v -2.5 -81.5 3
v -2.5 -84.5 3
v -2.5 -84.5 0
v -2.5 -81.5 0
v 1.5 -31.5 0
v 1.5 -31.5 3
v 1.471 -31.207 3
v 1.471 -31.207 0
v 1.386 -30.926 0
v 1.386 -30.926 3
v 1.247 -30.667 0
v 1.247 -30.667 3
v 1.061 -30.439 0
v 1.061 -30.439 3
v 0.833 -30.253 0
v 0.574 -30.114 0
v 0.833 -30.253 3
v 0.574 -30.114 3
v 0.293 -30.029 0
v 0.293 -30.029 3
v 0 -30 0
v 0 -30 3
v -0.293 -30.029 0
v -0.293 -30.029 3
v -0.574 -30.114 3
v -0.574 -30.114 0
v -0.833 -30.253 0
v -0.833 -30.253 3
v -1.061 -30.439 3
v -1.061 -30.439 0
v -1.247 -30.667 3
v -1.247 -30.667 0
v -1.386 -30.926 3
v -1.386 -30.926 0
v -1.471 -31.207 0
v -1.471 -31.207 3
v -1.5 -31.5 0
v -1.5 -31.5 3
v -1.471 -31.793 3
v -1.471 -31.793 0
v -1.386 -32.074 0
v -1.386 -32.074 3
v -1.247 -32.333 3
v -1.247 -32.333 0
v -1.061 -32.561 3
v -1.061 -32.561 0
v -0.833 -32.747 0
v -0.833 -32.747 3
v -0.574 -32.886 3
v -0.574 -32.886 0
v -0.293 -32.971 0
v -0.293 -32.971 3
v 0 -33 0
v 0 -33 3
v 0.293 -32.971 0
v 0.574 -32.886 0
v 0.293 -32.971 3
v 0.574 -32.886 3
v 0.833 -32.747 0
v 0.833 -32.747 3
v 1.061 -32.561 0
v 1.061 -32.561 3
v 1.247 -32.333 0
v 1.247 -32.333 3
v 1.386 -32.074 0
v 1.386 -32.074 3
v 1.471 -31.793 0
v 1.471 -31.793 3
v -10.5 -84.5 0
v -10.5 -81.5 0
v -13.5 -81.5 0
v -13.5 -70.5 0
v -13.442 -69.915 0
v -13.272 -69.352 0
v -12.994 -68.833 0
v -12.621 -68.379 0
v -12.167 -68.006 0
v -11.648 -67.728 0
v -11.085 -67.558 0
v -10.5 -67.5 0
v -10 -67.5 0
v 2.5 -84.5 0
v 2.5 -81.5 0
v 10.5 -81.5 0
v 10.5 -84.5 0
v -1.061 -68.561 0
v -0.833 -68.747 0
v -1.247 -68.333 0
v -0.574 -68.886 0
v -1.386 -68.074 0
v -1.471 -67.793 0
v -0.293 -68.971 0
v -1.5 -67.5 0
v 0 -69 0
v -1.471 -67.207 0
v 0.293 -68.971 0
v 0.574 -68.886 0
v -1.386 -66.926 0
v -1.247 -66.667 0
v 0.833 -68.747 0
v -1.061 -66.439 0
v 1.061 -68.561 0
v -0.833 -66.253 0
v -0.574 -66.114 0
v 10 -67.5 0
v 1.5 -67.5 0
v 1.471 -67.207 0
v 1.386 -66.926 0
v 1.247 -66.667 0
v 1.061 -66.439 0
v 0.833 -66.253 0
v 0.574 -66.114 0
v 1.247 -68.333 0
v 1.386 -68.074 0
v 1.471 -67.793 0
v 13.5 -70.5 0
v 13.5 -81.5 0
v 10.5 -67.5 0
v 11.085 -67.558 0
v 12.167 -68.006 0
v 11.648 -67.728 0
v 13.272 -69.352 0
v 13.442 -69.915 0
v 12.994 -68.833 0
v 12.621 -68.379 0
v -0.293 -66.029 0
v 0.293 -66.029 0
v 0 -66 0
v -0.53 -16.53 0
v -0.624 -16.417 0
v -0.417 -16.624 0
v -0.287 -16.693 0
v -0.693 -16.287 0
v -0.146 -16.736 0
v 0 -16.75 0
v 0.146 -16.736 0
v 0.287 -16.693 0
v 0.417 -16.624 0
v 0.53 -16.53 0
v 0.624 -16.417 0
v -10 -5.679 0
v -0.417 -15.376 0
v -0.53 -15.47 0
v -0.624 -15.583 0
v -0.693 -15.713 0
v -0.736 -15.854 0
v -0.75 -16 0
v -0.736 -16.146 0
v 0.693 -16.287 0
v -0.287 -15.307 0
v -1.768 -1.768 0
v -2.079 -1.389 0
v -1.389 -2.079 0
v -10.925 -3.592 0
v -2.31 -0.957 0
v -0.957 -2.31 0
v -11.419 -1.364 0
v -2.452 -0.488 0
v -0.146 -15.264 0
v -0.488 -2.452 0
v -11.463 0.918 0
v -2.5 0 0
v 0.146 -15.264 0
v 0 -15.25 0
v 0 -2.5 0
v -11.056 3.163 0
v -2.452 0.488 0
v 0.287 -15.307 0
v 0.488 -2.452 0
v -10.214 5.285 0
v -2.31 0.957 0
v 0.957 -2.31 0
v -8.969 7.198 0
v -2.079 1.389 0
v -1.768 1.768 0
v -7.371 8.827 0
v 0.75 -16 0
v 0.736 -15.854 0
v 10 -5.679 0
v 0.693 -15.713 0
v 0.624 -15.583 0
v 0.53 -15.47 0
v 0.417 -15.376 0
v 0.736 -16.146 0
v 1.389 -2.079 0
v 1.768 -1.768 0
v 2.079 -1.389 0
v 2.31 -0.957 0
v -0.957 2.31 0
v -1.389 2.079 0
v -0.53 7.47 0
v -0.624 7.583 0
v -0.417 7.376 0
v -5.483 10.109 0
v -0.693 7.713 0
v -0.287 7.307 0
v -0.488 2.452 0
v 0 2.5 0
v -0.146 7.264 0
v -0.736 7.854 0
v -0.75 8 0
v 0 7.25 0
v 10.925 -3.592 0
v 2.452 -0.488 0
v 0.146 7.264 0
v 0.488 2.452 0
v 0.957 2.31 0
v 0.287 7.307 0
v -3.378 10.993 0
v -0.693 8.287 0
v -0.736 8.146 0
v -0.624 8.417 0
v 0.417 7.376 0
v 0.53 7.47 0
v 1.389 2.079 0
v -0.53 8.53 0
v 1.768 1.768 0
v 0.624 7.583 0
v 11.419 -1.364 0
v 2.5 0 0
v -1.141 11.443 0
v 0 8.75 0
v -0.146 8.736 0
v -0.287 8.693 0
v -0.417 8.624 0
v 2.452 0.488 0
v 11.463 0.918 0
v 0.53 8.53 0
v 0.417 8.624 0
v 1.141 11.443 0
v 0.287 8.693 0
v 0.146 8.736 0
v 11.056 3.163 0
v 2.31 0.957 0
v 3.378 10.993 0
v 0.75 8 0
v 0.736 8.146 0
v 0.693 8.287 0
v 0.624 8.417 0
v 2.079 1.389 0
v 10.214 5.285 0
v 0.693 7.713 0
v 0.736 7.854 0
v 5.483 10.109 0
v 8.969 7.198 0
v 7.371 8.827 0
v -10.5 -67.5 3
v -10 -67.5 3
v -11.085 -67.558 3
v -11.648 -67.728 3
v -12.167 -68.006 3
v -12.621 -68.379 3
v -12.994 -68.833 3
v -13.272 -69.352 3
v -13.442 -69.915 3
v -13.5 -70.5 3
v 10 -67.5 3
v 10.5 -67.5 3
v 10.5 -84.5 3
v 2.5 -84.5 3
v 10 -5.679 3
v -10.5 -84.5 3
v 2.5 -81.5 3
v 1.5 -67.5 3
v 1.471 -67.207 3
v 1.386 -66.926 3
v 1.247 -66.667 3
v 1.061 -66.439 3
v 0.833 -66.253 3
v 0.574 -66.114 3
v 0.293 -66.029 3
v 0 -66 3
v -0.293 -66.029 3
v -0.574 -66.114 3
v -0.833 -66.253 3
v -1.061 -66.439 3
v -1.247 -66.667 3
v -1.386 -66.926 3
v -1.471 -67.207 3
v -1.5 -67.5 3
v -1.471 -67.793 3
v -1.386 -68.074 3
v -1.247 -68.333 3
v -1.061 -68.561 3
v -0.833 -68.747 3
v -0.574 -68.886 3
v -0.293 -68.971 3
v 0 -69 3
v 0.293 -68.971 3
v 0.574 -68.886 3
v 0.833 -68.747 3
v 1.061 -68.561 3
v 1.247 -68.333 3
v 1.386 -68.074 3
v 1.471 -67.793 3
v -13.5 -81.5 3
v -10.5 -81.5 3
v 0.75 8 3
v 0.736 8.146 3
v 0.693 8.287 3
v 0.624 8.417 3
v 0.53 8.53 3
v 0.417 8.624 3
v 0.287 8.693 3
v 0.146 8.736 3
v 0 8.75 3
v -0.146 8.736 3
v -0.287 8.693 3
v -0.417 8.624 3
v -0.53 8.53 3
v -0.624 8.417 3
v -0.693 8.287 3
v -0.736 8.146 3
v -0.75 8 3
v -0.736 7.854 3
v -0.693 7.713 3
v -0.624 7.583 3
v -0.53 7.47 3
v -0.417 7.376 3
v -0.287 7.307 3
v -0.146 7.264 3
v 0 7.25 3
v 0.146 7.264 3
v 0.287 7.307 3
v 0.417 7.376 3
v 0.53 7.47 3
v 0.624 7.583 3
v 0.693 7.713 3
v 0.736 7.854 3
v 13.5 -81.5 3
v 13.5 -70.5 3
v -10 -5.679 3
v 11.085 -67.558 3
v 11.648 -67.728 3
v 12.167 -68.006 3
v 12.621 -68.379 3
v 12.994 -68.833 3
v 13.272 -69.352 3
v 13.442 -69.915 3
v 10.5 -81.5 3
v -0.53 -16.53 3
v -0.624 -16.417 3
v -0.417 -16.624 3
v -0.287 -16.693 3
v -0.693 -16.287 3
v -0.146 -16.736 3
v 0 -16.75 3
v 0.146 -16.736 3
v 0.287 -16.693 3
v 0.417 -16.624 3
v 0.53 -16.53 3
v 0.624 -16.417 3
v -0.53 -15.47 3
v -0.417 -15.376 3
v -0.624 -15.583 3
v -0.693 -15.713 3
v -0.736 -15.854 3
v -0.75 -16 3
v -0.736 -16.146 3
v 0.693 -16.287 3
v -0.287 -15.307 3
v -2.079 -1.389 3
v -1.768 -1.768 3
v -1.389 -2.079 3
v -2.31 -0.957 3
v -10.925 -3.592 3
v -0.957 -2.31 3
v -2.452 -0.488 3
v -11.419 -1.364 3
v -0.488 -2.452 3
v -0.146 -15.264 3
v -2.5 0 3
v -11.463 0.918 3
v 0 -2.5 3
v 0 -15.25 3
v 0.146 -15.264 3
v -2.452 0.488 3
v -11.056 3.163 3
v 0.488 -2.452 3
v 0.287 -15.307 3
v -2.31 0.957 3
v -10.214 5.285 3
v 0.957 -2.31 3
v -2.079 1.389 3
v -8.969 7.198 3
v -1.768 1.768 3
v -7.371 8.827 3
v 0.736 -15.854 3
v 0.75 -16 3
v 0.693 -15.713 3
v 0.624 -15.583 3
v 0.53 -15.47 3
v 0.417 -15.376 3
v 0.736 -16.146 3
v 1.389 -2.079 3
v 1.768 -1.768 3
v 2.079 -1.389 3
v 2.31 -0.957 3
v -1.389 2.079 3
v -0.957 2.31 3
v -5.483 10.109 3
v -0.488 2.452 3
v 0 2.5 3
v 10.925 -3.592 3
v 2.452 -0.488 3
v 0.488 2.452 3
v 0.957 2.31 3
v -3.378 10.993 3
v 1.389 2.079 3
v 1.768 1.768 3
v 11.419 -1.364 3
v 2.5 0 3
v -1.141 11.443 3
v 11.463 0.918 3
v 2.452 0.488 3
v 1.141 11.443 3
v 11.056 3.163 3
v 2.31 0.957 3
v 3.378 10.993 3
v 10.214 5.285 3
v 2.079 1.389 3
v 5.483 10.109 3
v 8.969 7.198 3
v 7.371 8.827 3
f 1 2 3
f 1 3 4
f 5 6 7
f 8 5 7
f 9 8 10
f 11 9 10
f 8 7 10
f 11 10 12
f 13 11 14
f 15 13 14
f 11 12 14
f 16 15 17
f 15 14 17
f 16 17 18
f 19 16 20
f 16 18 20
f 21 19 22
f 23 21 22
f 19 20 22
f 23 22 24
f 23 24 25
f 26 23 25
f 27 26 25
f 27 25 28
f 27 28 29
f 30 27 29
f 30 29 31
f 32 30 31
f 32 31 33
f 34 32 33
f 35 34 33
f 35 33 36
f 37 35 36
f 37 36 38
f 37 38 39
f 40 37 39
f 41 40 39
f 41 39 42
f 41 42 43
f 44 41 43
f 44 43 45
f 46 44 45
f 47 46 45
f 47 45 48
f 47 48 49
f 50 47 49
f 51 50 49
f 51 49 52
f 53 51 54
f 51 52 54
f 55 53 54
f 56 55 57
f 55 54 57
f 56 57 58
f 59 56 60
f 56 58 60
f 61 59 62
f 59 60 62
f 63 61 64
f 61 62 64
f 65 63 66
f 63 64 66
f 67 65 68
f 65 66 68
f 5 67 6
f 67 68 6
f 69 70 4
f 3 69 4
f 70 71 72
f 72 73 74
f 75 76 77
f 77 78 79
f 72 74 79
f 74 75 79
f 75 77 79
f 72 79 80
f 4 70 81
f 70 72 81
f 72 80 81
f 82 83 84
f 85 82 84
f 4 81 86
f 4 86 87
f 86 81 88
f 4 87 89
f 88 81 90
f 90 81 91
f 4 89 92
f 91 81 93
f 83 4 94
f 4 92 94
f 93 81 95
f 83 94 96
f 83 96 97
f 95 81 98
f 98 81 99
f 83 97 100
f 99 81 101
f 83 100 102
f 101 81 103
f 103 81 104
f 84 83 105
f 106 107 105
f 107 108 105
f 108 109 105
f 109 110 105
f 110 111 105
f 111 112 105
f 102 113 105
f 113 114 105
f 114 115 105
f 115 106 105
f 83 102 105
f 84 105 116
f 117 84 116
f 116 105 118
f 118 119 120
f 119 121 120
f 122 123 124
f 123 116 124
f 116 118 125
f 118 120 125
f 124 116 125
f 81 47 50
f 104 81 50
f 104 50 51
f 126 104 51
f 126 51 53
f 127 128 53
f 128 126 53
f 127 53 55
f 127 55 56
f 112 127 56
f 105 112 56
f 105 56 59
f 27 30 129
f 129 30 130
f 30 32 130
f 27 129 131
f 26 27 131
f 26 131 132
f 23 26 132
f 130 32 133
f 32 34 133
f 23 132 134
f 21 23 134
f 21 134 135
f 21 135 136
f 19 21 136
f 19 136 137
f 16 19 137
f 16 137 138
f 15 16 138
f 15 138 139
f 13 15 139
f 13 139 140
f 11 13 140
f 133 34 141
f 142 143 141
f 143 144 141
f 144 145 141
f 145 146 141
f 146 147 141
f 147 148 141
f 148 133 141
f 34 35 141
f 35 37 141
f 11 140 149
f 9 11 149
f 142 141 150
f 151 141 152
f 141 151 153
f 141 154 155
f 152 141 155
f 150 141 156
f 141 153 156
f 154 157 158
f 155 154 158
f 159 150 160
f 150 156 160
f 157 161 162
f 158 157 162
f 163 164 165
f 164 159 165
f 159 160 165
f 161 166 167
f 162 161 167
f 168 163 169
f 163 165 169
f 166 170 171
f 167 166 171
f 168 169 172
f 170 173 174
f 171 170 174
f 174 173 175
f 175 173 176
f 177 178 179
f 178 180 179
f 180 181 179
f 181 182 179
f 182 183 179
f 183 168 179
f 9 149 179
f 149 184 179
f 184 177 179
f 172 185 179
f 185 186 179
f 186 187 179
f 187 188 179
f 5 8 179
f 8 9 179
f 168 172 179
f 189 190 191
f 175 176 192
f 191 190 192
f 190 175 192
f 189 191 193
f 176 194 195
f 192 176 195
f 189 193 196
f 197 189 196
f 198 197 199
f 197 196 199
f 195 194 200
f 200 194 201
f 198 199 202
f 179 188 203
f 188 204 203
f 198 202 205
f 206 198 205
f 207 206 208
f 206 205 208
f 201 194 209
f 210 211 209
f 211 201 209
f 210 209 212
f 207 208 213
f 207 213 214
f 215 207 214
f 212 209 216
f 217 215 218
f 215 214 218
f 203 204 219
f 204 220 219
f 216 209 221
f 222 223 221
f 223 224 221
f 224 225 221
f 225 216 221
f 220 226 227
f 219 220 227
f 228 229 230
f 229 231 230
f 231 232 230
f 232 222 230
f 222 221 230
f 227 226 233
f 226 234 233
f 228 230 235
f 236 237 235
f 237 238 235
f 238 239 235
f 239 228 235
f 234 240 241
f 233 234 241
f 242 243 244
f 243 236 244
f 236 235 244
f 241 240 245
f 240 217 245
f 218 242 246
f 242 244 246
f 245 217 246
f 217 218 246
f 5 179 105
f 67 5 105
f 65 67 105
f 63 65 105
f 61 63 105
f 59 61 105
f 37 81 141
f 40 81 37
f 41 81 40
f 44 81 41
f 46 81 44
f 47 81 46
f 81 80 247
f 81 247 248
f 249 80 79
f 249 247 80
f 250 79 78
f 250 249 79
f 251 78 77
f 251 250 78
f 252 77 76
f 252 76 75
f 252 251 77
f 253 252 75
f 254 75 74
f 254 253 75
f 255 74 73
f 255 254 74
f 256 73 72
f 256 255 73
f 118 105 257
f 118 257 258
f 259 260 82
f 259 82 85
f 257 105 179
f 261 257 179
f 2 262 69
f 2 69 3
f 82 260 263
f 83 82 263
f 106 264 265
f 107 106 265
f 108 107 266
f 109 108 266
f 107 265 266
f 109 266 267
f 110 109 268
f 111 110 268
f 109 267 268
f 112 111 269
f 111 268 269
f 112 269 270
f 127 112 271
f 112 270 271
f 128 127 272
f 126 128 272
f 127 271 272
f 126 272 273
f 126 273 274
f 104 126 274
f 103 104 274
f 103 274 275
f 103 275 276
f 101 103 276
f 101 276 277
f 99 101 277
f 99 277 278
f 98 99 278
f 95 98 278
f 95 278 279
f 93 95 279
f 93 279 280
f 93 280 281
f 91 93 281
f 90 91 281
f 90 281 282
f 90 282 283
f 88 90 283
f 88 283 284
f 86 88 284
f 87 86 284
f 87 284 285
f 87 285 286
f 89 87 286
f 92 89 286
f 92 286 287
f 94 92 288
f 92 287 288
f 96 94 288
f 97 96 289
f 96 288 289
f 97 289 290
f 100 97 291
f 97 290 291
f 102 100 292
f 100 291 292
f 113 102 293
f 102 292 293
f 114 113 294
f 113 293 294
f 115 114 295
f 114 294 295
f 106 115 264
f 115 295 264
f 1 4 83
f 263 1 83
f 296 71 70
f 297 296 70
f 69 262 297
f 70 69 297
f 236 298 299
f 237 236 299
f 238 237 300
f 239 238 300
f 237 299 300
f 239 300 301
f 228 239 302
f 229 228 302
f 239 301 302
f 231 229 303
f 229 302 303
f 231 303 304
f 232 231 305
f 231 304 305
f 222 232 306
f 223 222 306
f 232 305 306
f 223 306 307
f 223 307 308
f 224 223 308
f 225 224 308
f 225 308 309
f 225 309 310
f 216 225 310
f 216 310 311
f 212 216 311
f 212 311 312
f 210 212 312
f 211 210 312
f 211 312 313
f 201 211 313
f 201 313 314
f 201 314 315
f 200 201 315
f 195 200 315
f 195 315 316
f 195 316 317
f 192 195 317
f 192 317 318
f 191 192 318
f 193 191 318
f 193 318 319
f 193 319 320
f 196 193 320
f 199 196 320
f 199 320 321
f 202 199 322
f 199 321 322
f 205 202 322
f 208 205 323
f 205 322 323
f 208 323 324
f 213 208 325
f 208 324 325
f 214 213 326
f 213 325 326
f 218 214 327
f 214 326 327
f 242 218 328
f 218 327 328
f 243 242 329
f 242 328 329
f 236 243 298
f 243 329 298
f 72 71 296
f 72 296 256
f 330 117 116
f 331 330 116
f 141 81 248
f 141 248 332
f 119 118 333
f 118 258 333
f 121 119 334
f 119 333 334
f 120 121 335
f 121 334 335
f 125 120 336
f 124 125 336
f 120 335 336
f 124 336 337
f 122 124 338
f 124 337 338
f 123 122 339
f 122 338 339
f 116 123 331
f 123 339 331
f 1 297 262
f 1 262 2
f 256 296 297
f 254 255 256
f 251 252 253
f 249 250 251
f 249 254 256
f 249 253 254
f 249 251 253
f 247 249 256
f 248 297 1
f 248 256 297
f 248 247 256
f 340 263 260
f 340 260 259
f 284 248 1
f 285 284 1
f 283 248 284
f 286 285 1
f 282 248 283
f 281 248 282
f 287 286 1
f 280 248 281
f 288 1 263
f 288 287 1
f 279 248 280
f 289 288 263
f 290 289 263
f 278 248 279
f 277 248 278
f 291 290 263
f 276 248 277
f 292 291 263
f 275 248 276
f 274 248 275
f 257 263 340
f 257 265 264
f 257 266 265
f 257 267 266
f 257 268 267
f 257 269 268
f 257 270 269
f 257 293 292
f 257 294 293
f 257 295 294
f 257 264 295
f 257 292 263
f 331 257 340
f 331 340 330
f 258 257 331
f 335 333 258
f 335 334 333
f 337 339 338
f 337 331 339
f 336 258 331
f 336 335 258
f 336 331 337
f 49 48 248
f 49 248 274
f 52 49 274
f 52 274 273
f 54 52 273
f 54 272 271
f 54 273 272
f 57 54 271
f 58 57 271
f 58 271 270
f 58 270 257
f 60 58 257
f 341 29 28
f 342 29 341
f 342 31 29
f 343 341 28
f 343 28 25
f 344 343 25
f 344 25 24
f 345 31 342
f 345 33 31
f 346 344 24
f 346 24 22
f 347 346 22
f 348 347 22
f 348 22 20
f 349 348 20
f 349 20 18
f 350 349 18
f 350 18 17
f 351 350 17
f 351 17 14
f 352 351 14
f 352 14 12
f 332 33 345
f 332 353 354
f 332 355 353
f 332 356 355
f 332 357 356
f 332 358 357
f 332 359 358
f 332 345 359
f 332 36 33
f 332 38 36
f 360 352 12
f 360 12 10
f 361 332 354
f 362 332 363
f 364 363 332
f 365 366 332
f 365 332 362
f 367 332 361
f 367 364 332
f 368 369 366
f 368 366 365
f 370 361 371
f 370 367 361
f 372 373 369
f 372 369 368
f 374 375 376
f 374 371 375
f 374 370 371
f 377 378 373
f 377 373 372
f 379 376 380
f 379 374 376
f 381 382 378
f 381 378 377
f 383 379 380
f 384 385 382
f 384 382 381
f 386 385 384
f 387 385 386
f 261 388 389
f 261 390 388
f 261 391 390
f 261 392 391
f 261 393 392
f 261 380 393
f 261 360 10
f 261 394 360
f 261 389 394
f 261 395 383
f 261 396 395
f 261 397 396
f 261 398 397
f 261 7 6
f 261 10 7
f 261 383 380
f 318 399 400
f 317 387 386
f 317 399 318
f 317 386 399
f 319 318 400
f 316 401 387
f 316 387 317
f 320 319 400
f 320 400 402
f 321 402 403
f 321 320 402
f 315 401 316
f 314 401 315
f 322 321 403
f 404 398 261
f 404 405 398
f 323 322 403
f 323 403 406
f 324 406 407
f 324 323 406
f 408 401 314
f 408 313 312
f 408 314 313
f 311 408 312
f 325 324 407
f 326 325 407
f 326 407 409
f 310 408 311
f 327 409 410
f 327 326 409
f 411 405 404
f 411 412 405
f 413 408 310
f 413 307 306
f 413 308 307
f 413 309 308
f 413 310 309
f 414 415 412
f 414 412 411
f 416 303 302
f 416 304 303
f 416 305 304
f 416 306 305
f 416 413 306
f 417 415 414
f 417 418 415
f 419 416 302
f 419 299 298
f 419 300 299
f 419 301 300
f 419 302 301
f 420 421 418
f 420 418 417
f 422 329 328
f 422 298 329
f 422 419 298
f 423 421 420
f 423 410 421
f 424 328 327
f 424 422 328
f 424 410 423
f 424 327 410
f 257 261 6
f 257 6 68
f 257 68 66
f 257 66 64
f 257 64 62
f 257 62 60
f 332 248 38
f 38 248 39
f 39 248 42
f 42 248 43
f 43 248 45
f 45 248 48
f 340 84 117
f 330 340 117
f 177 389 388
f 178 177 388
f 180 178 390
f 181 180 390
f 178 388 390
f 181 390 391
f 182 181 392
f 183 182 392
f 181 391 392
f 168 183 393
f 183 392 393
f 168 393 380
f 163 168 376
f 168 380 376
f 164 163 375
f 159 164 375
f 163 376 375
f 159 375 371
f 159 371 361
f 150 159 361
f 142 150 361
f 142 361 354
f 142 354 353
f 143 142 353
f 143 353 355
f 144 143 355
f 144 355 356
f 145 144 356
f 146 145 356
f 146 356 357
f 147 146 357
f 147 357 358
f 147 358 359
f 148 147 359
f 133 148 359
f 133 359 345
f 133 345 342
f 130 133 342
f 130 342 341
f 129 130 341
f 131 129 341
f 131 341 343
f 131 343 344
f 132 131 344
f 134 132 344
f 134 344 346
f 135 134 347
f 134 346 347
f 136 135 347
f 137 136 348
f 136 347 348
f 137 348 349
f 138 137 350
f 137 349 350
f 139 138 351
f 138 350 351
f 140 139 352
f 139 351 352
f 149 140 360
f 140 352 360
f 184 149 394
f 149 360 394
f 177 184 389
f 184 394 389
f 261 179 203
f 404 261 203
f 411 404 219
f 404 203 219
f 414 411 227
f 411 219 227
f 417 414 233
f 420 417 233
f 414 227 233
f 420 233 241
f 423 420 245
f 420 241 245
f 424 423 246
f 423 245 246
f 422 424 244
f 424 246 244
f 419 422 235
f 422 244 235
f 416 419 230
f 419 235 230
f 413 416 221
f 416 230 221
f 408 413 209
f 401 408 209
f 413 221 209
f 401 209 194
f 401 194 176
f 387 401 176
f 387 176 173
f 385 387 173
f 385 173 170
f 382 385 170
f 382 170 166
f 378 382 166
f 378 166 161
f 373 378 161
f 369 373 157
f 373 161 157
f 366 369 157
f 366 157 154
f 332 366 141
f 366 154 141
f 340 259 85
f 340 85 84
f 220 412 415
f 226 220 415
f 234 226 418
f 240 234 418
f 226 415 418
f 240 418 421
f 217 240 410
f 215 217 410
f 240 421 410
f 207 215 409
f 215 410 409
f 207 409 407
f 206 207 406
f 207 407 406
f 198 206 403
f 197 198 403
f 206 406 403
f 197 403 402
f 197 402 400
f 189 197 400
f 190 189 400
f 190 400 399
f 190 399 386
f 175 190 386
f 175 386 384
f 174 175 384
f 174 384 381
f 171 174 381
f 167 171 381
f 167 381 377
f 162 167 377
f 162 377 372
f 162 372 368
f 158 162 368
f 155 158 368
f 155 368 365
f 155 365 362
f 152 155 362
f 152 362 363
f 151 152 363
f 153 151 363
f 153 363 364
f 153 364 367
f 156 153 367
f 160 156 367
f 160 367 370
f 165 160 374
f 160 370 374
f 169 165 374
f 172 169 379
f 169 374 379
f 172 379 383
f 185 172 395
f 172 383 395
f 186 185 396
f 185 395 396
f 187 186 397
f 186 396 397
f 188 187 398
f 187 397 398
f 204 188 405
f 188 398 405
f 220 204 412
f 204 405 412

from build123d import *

# Parameters (mm, degrees)
CROQUIS1_R              = 11.5
CROQUIS1_W              = 20
CROQUIS1_H              = 67.5
CROQUIS1_W_2            = 27
CROQUIS1_H_2            = 14
SALIENTE_EXTRUIR1_DEPTH = 3
CROQUIS2_R              = 2.5
CROQUIS2_R_2            = 1.5
CORTAR_EXTRUIR1_DEPTH   = 4
REDONDEO1_R             = 3
CROQUIS3_R              = 0.75
CORTAR_EXTRUIR2_DEPTH   = 4
CROQUIS4_W              = 8
CROQUIS4_H              = 3
SALIENTE_EXTRUIR2_DEPTH = 3


with BuildPart() as part:
    # Croquis1 → Saliente-Extruir1 (new body)
    with BuildSketch(Plane.XY):
        Circle(CROQUIS1_R)
        with Locations((0, -33.75)):
            Rectangle(CROQUIS1_W, CROQUIS1_H)
        with Locations((0, -74.5)):
            Rectangle(CROQUIS1_W_2, CROQUIS1_H_2)
    extrude(amount=SALIENTE_EXTRUIR1_DEPTH)

    # Croquis2 → Cortar-Extruir1 (cut, through all)
    with BuildSketch(Plane.XY.offset(3)):
        Circle(CROQUIS2_R)
        with Locations((0, -31.5)):
            Circle(CROQUIS2_R_2)
        with Locations((0, -67.5)):
            Circle(CROQUIS2_R_2)
    extrude(amount=-CORTAR_EXTRUIR1_DEPTH, mode=Mode.SUBTRACT)

    # Redondeo1
    redondeo1_edges = [part.edges().sort_by_distance(p)[0] for p in [
        (13.5, -67.5, 1.5),
        (-13.5, -67.5, 1.5),
    ]]
    fillet(redondeo1_edges, radius=REDONDEO1_R)

    # Croquis3 → Cortar-Extruir2 (cut, through all)
    with BuildSketch(Plane.XY.offset(3)):
        with Locations((0, -16)):
            Circle(CROQUIS3_R)
        with Locations((0, 8)):
            Circle(CROQUIS3_R)
    extrude(amount=-CORTAR_EXTRUIR2_DEPTH, mode=Mode.SUBTRACT)

    # Croquis4 → Saliente-Extruir2 (add)
    with BuildSketch(Plane.XY.offset(3)):
        with Locations((-6.5, -83)):
            Rectangle(CROQUIS4_W, CROQUIS4_H)
        with Locations((6.5, -83)):
            Rectangle(CROQUIS4_W, CROQUIS4_H)
    extrude(amount=-SALIENTE_EXTRUIR2_DEPTH)


solid = part.part
